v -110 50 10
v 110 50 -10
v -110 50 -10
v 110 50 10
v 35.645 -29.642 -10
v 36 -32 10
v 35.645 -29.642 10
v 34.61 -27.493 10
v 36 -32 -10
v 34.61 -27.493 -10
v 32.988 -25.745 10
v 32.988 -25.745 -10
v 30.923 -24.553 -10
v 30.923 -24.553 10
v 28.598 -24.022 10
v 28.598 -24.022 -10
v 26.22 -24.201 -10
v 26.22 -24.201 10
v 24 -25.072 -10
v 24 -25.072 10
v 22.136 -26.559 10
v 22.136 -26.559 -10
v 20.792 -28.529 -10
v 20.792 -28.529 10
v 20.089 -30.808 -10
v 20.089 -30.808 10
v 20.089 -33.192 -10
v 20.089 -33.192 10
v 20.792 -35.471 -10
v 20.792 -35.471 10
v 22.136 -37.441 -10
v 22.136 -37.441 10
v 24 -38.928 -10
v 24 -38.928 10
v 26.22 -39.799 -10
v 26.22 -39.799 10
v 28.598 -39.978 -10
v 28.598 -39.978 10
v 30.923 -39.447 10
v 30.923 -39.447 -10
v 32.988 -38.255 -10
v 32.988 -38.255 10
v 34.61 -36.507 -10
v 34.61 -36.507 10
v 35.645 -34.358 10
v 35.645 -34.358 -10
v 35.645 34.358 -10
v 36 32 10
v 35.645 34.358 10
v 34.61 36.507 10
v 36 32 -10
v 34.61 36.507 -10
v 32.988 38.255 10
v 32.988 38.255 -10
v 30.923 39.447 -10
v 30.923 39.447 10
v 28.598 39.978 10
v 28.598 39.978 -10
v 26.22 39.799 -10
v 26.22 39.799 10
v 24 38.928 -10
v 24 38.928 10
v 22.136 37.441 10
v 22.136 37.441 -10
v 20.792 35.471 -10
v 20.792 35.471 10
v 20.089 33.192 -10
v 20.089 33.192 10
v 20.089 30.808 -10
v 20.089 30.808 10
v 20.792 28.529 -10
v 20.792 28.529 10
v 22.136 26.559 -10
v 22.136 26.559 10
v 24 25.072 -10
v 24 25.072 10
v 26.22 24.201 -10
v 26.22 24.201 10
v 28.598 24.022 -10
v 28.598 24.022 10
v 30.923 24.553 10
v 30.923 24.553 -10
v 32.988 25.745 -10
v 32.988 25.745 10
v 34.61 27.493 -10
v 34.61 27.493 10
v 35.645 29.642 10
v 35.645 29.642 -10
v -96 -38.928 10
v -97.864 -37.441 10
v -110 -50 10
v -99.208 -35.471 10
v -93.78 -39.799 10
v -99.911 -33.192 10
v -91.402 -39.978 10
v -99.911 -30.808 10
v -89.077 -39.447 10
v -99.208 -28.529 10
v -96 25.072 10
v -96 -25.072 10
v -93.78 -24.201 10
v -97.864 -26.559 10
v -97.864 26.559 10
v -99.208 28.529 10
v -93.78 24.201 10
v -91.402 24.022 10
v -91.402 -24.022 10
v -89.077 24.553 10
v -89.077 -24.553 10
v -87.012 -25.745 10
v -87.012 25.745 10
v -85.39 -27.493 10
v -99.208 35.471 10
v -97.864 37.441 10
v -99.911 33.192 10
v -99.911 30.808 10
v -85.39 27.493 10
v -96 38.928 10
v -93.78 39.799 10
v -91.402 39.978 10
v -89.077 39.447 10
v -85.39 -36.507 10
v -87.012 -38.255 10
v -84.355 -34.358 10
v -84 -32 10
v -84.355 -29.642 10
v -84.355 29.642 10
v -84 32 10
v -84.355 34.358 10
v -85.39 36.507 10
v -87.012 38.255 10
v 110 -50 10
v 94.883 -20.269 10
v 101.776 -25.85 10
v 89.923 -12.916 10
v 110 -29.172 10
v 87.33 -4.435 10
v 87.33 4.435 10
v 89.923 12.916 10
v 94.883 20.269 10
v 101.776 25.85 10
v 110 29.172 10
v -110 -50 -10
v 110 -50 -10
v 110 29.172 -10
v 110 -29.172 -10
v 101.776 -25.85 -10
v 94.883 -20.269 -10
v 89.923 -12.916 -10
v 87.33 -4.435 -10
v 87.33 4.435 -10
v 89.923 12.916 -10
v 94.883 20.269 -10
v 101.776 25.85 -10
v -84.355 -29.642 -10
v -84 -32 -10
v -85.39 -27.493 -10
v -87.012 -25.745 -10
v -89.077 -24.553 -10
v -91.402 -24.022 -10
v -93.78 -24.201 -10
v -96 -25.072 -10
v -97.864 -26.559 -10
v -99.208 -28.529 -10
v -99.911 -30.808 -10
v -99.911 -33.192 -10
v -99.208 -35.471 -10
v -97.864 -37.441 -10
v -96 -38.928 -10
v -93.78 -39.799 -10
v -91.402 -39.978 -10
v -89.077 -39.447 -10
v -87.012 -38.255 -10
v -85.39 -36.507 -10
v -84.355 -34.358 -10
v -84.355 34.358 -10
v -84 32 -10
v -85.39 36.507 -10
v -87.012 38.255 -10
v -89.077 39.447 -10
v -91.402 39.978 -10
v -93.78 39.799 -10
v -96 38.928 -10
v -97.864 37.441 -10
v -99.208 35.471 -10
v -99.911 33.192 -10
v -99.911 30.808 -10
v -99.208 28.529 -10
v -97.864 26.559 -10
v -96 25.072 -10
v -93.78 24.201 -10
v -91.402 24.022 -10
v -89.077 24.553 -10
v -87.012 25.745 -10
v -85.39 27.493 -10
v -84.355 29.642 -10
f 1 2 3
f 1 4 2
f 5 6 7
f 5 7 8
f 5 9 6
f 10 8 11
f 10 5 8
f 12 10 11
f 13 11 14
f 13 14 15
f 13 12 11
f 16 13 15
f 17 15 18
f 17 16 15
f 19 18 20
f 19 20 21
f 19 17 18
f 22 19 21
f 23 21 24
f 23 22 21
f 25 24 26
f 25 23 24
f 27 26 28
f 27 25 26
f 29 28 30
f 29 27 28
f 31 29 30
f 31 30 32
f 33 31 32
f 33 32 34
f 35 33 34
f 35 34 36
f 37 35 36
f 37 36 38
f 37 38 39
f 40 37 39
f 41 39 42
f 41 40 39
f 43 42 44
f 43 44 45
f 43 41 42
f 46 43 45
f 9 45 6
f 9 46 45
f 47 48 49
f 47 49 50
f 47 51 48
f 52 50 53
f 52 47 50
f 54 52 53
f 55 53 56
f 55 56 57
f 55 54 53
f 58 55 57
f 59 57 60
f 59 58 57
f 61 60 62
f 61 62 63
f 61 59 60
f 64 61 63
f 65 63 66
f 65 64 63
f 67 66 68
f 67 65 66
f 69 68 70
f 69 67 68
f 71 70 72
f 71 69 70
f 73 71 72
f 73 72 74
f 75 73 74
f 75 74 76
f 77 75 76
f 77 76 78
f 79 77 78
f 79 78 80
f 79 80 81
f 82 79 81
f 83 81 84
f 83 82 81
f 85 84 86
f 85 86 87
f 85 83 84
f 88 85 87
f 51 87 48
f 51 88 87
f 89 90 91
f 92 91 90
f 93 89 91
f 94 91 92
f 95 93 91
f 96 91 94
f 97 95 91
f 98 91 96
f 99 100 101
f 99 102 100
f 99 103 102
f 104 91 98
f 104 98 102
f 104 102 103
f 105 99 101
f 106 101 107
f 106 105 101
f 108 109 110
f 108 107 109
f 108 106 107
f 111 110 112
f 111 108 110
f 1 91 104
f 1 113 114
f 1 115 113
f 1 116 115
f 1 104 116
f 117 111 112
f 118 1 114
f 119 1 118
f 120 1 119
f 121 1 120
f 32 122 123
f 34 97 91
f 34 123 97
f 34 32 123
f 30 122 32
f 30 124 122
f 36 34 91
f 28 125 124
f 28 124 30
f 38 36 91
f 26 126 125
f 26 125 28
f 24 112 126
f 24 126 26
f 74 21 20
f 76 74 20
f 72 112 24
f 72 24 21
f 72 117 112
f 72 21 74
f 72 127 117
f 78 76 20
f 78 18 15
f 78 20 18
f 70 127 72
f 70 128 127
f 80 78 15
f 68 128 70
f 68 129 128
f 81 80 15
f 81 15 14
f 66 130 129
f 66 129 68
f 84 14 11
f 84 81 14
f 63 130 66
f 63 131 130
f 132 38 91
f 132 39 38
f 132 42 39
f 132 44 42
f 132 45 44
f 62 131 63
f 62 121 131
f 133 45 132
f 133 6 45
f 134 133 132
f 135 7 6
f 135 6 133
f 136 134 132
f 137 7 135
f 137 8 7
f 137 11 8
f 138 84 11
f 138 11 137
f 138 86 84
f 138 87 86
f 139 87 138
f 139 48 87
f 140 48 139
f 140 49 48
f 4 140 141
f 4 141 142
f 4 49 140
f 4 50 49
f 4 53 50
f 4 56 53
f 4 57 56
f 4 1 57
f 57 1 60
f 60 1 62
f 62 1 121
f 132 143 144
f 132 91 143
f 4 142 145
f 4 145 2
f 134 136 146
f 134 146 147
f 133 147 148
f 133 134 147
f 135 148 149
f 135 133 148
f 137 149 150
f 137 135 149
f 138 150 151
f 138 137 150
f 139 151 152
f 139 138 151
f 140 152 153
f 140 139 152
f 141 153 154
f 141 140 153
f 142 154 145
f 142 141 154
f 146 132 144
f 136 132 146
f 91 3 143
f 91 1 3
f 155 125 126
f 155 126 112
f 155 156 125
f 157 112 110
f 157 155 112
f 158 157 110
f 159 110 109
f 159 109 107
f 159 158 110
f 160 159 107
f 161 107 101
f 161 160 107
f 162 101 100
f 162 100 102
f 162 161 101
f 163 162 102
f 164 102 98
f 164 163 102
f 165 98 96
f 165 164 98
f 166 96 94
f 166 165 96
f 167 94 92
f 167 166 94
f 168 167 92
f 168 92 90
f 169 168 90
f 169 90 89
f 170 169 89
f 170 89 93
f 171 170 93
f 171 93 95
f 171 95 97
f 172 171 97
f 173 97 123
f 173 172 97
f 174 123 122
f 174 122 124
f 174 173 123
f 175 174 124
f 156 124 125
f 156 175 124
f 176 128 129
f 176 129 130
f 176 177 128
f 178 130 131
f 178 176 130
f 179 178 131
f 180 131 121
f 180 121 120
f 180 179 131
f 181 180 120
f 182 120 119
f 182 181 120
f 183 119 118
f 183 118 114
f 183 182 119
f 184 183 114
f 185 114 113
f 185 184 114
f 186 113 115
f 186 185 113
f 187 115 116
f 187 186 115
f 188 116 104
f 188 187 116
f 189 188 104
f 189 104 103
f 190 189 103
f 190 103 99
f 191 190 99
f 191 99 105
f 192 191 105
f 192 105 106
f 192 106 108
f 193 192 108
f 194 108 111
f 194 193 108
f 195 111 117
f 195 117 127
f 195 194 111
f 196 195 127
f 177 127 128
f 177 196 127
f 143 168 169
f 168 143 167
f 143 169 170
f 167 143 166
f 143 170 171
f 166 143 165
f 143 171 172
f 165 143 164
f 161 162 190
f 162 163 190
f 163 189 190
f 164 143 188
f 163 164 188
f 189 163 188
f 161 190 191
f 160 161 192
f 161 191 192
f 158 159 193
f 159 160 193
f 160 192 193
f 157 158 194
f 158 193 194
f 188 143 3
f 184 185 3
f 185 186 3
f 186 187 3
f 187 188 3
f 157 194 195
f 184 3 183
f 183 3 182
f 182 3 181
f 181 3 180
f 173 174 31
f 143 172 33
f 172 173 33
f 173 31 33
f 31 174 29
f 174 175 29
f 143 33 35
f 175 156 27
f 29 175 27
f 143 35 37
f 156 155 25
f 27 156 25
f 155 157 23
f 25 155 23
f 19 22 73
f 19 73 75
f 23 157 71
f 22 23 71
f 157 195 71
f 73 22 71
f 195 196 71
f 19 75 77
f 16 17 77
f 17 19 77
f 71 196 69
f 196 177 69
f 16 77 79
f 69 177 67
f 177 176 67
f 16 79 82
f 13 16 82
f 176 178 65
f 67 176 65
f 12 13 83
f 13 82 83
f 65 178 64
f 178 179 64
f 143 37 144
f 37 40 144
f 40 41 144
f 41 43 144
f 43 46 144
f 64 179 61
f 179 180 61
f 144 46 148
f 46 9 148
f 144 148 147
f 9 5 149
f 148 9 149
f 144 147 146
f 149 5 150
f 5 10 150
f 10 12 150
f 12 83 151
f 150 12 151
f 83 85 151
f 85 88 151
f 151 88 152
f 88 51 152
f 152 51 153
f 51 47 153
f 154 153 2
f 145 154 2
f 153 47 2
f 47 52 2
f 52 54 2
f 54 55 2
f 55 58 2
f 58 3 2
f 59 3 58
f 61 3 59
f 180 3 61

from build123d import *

# Parameters (mm, degrees)
F0_R     = 8
F1_DEPTH = 10


with BuildPart() as f1:
    # F0 (on Top) → F1 (new body, symmetric)
    with BuildSketch(Plane.XY):
        with BuildLine():
            Line((-110, -50), (110, -50))
            Line((110, -50), (110, -29.171904))
            ThreePointArc((110, -29.171904), (87, 0), (110, 29.171904))
            Line((110, 29.171904), (110, 50))
            Line((110, 50), (-110, 50))
            Line((-110, 50), (-110, -50))
        make_face()
        with Locations((-92, -32)):
            Circle(F0_R, mode=Mode.SUBTRACT)
        with Locations((28, -32)):
            Circle(F0_R, mode=Mode.SUBTRACT)
        with Locations((-92, 32)):
            Circle(F0_R, mode=Mode.SUBTRACT)
        with Locations((28, 32)):
            Circle(F0_R, mode=Mode.SUBTRACT)
    extrude(amount=F1_DEPTH, both=True)


solid = f1.part
